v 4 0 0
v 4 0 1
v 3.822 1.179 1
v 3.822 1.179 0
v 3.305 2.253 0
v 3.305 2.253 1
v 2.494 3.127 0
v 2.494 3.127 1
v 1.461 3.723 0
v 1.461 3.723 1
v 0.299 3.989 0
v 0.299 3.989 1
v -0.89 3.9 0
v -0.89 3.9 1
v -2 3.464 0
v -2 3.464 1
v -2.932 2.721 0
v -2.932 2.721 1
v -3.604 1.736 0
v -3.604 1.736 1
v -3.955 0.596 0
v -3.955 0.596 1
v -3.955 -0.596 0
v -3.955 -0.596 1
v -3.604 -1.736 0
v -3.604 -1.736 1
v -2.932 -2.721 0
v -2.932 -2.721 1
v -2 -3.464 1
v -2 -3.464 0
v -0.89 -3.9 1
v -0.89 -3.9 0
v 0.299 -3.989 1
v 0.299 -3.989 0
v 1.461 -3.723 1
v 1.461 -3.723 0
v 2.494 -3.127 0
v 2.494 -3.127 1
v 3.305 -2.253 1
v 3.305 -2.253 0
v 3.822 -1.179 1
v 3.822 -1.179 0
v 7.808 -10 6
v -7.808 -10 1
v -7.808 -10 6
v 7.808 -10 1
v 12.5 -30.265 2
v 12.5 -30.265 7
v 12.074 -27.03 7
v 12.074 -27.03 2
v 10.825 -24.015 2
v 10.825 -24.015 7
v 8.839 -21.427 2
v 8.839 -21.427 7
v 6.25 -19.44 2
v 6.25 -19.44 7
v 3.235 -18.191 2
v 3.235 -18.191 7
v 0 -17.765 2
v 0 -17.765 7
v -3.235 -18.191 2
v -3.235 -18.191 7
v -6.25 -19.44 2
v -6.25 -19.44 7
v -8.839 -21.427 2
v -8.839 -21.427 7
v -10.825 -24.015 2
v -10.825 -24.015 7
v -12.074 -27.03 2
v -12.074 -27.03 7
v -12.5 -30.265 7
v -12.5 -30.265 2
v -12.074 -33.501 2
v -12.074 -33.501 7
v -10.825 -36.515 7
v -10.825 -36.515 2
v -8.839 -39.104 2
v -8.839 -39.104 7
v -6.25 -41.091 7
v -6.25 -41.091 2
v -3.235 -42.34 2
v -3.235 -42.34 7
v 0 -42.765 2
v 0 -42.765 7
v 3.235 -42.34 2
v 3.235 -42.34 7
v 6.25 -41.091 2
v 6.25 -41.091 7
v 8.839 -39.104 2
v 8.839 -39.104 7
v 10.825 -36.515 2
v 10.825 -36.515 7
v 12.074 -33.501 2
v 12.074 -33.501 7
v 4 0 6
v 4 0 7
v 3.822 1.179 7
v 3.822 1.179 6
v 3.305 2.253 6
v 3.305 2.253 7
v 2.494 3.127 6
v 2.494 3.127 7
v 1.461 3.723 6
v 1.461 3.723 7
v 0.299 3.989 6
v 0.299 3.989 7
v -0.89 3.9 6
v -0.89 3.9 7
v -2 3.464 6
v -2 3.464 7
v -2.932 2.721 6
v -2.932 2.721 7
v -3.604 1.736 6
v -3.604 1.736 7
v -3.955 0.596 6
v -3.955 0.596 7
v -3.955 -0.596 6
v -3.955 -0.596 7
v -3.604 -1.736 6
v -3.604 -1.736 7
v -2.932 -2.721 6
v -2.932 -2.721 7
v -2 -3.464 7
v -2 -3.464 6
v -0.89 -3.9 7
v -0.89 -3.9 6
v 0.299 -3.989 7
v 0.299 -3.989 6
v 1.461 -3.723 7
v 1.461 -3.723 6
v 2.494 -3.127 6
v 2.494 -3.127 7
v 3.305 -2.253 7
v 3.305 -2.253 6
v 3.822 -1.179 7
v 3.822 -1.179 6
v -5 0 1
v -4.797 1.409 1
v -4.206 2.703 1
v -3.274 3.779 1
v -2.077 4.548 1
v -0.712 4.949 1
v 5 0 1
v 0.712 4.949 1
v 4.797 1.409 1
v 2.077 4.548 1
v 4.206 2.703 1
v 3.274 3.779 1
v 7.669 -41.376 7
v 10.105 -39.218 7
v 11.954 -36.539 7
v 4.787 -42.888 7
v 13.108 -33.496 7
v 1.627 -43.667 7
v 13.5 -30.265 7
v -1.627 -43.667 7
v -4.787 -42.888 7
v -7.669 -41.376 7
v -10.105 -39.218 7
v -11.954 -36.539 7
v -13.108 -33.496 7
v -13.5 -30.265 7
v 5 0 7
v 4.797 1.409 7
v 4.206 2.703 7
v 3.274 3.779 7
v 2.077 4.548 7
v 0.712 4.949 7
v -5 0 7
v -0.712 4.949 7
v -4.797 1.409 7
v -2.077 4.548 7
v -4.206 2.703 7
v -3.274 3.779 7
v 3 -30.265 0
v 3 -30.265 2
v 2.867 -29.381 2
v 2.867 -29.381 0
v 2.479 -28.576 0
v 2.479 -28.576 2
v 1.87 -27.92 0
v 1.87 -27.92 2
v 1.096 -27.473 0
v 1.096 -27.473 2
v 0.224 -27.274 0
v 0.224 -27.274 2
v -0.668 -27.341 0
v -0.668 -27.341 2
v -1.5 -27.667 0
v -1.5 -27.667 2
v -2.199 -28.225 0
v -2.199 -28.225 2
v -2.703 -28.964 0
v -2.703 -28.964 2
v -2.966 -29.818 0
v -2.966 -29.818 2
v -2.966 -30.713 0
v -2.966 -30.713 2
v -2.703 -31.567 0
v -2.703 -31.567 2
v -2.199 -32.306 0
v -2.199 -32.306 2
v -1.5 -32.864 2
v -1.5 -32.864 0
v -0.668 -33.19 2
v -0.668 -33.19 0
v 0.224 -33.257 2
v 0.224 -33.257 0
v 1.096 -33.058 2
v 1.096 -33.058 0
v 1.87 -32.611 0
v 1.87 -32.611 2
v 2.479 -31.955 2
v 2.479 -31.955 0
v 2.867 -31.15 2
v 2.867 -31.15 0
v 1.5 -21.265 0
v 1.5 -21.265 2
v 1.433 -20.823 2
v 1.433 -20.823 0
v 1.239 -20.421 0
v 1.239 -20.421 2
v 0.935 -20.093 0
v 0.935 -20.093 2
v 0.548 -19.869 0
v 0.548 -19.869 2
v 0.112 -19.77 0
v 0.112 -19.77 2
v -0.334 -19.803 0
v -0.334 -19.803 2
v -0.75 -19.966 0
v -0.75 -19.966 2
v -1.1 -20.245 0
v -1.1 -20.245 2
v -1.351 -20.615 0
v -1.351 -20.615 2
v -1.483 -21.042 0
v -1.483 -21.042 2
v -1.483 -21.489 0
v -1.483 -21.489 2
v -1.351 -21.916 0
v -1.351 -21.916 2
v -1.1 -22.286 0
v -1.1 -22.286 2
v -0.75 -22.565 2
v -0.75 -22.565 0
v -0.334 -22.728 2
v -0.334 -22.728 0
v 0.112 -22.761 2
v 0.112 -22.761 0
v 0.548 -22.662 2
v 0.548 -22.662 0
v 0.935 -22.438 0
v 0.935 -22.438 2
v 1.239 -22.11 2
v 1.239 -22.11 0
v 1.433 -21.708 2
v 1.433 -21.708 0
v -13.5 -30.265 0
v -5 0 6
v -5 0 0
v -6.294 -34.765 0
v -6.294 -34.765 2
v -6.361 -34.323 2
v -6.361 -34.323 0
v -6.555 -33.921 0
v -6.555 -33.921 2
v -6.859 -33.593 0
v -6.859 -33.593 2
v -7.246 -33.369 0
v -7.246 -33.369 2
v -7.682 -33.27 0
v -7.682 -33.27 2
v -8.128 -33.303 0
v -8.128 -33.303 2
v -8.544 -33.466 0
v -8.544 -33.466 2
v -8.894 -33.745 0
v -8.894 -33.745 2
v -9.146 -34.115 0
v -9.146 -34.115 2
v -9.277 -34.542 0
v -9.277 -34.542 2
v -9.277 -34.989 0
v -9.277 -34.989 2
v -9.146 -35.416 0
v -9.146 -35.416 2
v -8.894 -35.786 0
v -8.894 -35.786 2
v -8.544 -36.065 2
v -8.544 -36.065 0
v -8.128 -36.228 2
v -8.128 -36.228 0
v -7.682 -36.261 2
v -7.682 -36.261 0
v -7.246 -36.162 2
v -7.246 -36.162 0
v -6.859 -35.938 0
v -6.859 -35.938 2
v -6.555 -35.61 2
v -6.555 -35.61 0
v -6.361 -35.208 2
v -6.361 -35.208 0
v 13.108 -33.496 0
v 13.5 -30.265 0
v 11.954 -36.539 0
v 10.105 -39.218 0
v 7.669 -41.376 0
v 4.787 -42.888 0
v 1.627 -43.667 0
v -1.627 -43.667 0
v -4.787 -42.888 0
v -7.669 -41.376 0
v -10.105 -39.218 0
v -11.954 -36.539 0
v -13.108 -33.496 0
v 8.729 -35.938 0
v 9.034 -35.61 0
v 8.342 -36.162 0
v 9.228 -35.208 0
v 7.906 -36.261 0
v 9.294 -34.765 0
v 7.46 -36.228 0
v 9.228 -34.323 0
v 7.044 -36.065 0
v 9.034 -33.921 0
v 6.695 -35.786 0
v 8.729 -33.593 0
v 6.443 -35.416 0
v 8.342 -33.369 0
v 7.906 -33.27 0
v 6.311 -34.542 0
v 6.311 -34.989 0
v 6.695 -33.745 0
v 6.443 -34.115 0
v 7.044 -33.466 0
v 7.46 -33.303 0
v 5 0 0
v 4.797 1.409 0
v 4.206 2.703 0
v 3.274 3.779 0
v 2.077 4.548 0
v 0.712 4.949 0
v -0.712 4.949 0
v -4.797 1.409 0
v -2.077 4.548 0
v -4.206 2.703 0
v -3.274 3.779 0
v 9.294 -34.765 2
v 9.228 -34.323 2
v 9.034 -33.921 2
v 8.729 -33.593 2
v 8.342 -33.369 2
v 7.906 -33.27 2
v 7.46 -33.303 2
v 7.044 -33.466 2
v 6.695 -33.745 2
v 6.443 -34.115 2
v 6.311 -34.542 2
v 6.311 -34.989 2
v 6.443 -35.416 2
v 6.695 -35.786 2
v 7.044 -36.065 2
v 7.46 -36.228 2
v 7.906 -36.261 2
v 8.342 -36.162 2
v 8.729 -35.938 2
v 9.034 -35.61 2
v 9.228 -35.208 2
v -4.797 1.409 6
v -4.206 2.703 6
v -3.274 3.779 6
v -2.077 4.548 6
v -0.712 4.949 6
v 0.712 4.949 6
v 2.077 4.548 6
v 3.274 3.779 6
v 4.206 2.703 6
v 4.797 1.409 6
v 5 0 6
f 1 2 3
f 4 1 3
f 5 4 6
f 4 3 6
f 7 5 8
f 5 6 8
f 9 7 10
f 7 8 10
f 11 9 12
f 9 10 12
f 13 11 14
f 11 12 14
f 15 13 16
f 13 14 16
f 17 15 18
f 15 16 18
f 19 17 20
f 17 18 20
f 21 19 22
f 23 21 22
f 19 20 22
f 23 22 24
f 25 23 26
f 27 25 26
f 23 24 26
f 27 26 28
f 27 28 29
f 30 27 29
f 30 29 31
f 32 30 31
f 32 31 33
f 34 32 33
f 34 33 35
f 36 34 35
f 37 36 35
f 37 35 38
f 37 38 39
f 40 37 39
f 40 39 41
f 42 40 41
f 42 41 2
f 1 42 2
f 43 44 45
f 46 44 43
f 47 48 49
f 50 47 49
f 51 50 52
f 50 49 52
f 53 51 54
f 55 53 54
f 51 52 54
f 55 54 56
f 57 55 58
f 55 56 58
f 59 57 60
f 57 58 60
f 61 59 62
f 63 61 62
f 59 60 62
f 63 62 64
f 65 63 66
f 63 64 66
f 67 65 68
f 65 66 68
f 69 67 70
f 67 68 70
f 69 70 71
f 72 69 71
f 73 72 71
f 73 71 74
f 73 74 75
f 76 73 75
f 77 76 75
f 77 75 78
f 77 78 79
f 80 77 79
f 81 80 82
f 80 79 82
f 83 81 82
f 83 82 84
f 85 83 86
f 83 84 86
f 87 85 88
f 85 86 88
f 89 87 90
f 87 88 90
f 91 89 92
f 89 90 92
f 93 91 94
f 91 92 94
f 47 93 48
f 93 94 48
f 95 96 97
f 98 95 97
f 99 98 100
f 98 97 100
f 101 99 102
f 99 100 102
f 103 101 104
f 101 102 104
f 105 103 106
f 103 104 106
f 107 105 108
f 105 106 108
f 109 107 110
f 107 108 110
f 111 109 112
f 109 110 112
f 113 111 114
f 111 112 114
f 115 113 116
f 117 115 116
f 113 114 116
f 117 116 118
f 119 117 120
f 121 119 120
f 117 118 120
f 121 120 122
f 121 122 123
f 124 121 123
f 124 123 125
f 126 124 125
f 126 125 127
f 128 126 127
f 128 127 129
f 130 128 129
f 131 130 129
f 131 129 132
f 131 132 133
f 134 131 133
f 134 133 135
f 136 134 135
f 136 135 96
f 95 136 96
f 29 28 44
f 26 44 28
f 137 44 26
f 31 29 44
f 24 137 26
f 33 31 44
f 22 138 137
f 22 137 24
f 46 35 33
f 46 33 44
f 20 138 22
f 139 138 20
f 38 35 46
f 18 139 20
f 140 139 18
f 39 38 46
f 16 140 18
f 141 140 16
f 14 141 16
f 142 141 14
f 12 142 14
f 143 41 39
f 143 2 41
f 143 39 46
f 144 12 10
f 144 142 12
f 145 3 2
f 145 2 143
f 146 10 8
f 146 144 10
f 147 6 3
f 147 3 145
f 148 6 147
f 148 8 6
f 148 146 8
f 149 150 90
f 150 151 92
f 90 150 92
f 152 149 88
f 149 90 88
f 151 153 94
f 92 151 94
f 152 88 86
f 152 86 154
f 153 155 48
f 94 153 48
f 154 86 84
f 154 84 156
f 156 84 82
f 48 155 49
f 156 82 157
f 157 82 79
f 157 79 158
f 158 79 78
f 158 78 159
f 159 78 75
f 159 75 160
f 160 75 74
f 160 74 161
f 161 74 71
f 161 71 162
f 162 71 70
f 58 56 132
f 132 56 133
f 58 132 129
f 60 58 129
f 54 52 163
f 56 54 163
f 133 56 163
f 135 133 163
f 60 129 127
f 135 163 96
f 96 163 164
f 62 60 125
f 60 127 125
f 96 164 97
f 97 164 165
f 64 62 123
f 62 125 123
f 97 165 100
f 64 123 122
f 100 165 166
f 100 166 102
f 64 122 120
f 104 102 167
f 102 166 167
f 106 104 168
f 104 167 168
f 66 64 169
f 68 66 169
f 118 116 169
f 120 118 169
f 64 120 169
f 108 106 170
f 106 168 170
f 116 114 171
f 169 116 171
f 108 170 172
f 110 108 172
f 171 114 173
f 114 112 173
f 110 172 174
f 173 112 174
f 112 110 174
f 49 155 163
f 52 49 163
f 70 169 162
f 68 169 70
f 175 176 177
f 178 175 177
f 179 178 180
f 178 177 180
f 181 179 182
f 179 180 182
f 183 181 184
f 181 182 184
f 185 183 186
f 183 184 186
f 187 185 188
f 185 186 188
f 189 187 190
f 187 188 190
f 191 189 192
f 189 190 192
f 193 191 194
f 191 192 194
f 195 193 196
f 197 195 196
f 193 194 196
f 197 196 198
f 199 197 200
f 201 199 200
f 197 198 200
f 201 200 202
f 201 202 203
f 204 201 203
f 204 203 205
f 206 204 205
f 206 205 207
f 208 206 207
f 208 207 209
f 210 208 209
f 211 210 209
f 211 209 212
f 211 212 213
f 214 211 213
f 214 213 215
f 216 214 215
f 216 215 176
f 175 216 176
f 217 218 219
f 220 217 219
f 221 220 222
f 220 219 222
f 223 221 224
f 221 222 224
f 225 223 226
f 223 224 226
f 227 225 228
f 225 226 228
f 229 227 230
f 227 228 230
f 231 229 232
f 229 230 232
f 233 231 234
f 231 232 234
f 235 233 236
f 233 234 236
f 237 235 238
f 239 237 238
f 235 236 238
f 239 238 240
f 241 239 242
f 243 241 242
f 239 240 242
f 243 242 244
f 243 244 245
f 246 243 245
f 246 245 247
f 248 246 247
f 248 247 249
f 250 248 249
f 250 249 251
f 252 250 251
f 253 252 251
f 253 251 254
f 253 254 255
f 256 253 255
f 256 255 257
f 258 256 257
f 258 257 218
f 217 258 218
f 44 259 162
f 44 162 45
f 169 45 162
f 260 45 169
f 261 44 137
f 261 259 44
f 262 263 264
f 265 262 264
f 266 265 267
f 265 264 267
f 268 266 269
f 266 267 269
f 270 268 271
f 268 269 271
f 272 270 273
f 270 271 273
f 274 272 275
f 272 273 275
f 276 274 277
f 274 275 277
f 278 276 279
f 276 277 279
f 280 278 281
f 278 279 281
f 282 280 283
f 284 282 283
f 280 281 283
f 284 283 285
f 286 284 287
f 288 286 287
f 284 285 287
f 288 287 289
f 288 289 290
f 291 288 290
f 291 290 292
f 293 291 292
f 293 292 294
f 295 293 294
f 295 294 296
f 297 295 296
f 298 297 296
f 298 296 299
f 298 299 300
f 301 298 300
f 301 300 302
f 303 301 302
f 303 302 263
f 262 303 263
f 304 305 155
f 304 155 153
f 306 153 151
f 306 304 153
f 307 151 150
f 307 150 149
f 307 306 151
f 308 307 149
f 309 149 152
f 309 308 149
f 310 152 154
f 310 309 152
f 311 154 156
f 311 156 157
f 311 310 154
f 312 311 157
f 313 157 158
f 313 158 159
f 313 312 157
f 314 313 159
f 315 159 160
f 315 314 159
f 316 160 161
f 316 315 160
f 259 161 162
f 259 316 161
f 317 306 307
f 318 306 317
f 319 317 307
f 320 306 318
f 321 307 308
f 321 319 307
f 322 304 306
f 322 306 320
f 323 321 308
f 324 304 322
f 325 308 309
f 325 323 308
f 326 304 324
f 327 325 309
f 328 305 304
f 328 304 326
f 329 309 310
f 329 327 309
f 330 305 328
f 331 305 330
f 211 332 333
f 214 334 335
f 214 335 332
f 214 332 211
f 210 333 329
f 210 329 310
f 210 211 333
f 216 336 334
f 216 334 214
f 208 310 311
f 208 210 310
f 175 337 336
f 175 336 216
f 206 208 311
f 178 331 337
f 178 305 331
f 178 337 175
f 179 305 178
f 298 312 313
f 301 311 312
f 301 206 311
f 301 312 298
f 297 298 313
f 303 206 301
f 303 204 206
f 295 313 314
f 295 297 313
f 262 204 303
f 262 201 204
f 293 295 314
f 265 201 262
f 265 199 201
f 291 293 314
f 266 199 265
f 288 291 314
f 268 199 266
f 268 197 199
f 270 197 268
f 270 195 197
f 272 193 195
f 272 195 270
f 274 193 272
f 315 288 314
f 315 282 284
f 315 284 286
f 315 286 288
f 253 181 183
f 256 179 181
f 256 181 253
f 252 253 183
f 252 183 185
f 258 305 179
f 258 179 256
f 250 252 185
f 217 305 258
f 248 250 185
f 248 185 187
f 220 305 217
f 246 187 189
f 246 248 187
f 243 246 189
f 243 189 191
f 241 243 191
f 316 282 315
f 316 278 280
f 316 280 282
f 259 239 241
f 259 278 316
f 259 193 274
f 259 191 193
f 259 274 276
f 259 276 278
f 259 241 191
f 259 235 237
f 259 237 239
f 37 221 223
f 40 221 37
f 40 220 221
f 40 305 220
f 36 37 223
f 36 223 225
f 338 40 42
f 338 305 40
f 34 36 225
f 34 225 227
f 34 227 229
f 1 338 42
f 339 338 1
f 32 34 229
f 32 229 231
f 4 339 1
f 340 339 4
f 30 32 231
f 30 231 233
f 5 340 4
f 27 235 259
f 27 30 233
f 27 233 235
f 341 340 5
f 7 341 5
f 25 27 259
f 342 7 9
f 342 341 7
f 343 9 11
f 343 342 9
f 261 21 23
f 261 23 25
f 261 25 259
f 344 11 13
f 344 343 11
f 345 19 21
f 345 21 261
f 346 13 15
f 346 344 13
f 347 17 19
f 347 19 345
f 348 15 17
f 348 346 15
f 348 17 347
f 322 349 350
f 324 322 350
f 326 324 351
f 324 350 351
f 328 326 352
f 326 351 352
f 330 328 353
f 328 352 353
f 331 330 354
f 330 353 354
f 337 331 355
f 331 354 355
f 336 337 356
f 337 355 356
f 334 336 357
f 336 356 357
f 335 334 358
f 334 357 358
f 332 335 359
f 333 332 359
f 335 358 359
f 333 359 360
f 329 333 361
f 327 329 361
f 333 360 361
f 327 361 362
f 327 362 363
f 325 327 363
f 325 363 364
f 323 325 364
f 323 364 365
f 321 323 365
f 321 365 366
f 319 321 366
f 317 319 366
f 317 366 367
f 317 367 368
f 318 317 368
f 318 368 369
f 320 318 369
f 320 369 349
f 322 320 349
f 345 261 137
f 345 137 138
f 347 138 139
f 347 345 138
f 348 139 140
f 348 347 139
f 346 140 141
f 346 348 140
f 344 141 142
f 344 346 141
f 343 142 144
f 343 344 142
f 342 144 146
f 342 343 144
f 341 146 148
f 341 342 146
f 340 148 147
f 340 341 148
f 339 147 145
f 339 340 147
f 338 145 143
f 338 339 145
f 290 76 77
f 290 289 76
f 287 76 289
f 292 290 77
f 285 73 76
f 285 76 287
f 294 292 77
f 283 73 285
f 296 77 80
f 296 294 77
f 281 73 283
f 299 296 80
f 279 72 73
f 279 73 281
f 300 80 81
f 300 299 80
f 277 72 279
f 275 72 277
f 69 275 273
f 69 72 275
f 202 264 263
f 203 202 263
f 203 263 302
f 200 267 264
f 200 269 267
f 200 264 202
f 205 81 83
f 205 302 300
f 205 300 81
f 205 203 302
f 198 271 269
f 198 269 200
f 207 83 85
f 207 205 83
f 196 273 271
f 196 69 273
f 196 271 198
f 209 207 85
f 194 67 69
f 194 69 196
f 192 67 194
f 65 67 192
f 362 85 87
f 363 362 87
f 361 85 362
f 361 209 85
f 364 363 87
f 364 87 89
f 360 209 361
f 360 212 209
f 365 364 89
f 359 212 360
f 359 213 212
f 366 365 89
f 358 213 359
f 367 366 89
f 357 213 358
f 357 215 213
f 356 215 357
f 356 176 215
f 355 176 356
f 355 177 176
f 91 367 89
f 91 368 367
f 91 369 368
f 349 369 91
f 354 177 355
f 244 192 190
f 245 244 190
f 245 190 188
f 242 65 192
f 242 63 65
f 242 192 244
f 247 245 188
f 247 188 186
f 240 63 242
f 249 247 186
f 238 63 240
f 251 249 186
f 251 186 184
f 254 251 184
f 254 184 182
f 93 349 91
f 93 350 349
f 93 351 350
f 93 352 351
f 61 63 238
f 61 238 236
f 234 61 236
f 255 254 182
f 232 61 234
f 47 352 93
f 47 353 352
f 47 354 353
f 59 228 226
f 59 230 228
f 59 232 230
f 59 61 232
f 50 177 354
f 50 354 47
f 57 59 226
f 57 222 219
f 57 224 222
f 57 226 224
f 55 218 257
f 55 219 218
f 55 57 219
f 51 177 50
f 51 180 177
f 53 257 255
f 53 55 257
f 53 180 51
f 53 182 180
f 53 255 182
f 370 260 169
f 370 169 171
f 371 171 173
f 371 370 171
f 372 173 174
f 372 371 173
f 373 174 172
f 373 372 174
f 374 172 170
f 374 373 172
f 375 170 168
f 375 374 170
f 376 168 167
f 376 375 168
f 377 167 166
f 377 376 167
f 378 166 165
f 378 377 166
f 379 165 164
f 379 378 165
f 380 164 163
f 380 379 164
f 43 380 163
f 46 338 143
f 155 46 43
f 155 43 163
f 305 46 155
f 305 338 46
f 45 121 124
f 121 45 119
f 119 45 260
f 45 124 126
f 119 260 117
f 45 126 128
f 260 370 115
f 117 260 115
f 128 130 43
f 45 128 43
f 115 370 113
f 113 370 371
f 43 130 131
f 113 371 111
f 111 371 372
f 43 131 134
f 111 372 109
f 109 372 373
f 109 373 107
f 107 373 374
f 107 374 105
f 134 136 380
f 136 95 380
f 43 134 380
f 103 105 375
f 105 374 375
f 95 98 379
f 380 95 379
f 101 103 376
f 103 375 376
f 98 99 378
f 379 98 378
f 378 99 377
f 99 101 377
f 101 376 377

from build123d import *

# Parameters (mm, degrees)
BOSS_EXTRU_1_DEPTH      = 7
ESQUISSE2_R             = 3
ENL_V_MAT_EXTRU_1_DEPTH = 7
ESQUISSE3_R             = 1.5
ENL_V_MAT_EXTRU_2_DEPTH = 7
ESQUISSE4_R             = 4
ENL_V_MAT_EXTRU_3_DEPTH = 7
ESQUISSE5_R             = 12.5
ENL_V_MAT_EXTRU_4_DEPTH = 5
ESQUISSE6_W             = 27
ESQUISSE6_H             = 5
ENL_V_MAT_EXTRU_5_DEPTH = 20


with BuildPart() as part:
    # Esquisse1 → Boss.-Extru.1 (new body)
    with BuildSketch(Plane.XY):
        with BuildLine():
            Line((5, 0), (13.5, -30.265491901))
            ThreePointArc((13.5, -30.265491901), (0, -43.765491901), (-13.5, -30.265491901))
            Line((-13.5, -30.265491901), (-5, 0))
            ThreePointArc((-5, 0), (0, 5), (5, 0))
        make_face()
    extrude(amount=BOSS_EXTRU_1_DEPTH)

    # Esquisse2 → Enlèv. mat.-Extru.1 (cut)
    with BuildSketch(Plane.XY.offset(7)):
        with Locations((0, -30.265491901)):
            Circle(ESQUISSE2_R)
    extrude(amount=-ENL_V_MAT_EXTRU_1_DEPTH, mode=Mode.SUBTRACT)

    # Esquisse3 → Enlèv. mat.-Extru.2 (cut)
    with BuildSketch(Plane.XY.offset(7)):
        with Locations((0, -21.265491901)):
            Circle(ESQUISSE3_R)
        with Locations((-7.794228634, -34.765491901)):
            Circle(ESQUISSE3_R)
        with Locations((7.794228634, -34.765491901)):
            Circle(ESQUISSE3_R)
    extrude(amount=-ENL_V_MAT_EXTRU_2_DEPTH, mode=Mode.SUBTRACT)

    # Esquisse4 → Enlèv. mat.-Extru.3 (cut)
    with BuildSketch(Plane.XY.offset(7)):
        Circle(ESQUISSE4_R)
    extrude(amount=-ENL_V_MAT_EXTRU_3_DEPTH, mode=Mode.SUBTRACT)

    # Esquisse5 → Enlèv. mat.-Extru.4 (cut)
    with BuildSketch(Plane.XY.offset(7)):
        with Locations((0, -30.265491901)):
            Circle(ESQUISSE5_R)
    extrude(amount=-ENL_V_MAT_EXTRU_4_DEPTH, mode=Mode.SUBTRACT)

    # Esquisse6 → Enlèv. mat.-Extru.5 (cut)
    with BuildSketch(Plane(origin=(0, 10, 0), x_dir=(1, 0, 0), z_dir=(0, 1, 0))):
        with Locations((0, -3.5)):
            Rectangle(ESQUISSE6_W, ESQUISSE6_H)
    extrude(amount=-ENL_V_MAT_EXTRU_5_DEPTH, mode=Mode.SUBTRACT)


solid = part.part
